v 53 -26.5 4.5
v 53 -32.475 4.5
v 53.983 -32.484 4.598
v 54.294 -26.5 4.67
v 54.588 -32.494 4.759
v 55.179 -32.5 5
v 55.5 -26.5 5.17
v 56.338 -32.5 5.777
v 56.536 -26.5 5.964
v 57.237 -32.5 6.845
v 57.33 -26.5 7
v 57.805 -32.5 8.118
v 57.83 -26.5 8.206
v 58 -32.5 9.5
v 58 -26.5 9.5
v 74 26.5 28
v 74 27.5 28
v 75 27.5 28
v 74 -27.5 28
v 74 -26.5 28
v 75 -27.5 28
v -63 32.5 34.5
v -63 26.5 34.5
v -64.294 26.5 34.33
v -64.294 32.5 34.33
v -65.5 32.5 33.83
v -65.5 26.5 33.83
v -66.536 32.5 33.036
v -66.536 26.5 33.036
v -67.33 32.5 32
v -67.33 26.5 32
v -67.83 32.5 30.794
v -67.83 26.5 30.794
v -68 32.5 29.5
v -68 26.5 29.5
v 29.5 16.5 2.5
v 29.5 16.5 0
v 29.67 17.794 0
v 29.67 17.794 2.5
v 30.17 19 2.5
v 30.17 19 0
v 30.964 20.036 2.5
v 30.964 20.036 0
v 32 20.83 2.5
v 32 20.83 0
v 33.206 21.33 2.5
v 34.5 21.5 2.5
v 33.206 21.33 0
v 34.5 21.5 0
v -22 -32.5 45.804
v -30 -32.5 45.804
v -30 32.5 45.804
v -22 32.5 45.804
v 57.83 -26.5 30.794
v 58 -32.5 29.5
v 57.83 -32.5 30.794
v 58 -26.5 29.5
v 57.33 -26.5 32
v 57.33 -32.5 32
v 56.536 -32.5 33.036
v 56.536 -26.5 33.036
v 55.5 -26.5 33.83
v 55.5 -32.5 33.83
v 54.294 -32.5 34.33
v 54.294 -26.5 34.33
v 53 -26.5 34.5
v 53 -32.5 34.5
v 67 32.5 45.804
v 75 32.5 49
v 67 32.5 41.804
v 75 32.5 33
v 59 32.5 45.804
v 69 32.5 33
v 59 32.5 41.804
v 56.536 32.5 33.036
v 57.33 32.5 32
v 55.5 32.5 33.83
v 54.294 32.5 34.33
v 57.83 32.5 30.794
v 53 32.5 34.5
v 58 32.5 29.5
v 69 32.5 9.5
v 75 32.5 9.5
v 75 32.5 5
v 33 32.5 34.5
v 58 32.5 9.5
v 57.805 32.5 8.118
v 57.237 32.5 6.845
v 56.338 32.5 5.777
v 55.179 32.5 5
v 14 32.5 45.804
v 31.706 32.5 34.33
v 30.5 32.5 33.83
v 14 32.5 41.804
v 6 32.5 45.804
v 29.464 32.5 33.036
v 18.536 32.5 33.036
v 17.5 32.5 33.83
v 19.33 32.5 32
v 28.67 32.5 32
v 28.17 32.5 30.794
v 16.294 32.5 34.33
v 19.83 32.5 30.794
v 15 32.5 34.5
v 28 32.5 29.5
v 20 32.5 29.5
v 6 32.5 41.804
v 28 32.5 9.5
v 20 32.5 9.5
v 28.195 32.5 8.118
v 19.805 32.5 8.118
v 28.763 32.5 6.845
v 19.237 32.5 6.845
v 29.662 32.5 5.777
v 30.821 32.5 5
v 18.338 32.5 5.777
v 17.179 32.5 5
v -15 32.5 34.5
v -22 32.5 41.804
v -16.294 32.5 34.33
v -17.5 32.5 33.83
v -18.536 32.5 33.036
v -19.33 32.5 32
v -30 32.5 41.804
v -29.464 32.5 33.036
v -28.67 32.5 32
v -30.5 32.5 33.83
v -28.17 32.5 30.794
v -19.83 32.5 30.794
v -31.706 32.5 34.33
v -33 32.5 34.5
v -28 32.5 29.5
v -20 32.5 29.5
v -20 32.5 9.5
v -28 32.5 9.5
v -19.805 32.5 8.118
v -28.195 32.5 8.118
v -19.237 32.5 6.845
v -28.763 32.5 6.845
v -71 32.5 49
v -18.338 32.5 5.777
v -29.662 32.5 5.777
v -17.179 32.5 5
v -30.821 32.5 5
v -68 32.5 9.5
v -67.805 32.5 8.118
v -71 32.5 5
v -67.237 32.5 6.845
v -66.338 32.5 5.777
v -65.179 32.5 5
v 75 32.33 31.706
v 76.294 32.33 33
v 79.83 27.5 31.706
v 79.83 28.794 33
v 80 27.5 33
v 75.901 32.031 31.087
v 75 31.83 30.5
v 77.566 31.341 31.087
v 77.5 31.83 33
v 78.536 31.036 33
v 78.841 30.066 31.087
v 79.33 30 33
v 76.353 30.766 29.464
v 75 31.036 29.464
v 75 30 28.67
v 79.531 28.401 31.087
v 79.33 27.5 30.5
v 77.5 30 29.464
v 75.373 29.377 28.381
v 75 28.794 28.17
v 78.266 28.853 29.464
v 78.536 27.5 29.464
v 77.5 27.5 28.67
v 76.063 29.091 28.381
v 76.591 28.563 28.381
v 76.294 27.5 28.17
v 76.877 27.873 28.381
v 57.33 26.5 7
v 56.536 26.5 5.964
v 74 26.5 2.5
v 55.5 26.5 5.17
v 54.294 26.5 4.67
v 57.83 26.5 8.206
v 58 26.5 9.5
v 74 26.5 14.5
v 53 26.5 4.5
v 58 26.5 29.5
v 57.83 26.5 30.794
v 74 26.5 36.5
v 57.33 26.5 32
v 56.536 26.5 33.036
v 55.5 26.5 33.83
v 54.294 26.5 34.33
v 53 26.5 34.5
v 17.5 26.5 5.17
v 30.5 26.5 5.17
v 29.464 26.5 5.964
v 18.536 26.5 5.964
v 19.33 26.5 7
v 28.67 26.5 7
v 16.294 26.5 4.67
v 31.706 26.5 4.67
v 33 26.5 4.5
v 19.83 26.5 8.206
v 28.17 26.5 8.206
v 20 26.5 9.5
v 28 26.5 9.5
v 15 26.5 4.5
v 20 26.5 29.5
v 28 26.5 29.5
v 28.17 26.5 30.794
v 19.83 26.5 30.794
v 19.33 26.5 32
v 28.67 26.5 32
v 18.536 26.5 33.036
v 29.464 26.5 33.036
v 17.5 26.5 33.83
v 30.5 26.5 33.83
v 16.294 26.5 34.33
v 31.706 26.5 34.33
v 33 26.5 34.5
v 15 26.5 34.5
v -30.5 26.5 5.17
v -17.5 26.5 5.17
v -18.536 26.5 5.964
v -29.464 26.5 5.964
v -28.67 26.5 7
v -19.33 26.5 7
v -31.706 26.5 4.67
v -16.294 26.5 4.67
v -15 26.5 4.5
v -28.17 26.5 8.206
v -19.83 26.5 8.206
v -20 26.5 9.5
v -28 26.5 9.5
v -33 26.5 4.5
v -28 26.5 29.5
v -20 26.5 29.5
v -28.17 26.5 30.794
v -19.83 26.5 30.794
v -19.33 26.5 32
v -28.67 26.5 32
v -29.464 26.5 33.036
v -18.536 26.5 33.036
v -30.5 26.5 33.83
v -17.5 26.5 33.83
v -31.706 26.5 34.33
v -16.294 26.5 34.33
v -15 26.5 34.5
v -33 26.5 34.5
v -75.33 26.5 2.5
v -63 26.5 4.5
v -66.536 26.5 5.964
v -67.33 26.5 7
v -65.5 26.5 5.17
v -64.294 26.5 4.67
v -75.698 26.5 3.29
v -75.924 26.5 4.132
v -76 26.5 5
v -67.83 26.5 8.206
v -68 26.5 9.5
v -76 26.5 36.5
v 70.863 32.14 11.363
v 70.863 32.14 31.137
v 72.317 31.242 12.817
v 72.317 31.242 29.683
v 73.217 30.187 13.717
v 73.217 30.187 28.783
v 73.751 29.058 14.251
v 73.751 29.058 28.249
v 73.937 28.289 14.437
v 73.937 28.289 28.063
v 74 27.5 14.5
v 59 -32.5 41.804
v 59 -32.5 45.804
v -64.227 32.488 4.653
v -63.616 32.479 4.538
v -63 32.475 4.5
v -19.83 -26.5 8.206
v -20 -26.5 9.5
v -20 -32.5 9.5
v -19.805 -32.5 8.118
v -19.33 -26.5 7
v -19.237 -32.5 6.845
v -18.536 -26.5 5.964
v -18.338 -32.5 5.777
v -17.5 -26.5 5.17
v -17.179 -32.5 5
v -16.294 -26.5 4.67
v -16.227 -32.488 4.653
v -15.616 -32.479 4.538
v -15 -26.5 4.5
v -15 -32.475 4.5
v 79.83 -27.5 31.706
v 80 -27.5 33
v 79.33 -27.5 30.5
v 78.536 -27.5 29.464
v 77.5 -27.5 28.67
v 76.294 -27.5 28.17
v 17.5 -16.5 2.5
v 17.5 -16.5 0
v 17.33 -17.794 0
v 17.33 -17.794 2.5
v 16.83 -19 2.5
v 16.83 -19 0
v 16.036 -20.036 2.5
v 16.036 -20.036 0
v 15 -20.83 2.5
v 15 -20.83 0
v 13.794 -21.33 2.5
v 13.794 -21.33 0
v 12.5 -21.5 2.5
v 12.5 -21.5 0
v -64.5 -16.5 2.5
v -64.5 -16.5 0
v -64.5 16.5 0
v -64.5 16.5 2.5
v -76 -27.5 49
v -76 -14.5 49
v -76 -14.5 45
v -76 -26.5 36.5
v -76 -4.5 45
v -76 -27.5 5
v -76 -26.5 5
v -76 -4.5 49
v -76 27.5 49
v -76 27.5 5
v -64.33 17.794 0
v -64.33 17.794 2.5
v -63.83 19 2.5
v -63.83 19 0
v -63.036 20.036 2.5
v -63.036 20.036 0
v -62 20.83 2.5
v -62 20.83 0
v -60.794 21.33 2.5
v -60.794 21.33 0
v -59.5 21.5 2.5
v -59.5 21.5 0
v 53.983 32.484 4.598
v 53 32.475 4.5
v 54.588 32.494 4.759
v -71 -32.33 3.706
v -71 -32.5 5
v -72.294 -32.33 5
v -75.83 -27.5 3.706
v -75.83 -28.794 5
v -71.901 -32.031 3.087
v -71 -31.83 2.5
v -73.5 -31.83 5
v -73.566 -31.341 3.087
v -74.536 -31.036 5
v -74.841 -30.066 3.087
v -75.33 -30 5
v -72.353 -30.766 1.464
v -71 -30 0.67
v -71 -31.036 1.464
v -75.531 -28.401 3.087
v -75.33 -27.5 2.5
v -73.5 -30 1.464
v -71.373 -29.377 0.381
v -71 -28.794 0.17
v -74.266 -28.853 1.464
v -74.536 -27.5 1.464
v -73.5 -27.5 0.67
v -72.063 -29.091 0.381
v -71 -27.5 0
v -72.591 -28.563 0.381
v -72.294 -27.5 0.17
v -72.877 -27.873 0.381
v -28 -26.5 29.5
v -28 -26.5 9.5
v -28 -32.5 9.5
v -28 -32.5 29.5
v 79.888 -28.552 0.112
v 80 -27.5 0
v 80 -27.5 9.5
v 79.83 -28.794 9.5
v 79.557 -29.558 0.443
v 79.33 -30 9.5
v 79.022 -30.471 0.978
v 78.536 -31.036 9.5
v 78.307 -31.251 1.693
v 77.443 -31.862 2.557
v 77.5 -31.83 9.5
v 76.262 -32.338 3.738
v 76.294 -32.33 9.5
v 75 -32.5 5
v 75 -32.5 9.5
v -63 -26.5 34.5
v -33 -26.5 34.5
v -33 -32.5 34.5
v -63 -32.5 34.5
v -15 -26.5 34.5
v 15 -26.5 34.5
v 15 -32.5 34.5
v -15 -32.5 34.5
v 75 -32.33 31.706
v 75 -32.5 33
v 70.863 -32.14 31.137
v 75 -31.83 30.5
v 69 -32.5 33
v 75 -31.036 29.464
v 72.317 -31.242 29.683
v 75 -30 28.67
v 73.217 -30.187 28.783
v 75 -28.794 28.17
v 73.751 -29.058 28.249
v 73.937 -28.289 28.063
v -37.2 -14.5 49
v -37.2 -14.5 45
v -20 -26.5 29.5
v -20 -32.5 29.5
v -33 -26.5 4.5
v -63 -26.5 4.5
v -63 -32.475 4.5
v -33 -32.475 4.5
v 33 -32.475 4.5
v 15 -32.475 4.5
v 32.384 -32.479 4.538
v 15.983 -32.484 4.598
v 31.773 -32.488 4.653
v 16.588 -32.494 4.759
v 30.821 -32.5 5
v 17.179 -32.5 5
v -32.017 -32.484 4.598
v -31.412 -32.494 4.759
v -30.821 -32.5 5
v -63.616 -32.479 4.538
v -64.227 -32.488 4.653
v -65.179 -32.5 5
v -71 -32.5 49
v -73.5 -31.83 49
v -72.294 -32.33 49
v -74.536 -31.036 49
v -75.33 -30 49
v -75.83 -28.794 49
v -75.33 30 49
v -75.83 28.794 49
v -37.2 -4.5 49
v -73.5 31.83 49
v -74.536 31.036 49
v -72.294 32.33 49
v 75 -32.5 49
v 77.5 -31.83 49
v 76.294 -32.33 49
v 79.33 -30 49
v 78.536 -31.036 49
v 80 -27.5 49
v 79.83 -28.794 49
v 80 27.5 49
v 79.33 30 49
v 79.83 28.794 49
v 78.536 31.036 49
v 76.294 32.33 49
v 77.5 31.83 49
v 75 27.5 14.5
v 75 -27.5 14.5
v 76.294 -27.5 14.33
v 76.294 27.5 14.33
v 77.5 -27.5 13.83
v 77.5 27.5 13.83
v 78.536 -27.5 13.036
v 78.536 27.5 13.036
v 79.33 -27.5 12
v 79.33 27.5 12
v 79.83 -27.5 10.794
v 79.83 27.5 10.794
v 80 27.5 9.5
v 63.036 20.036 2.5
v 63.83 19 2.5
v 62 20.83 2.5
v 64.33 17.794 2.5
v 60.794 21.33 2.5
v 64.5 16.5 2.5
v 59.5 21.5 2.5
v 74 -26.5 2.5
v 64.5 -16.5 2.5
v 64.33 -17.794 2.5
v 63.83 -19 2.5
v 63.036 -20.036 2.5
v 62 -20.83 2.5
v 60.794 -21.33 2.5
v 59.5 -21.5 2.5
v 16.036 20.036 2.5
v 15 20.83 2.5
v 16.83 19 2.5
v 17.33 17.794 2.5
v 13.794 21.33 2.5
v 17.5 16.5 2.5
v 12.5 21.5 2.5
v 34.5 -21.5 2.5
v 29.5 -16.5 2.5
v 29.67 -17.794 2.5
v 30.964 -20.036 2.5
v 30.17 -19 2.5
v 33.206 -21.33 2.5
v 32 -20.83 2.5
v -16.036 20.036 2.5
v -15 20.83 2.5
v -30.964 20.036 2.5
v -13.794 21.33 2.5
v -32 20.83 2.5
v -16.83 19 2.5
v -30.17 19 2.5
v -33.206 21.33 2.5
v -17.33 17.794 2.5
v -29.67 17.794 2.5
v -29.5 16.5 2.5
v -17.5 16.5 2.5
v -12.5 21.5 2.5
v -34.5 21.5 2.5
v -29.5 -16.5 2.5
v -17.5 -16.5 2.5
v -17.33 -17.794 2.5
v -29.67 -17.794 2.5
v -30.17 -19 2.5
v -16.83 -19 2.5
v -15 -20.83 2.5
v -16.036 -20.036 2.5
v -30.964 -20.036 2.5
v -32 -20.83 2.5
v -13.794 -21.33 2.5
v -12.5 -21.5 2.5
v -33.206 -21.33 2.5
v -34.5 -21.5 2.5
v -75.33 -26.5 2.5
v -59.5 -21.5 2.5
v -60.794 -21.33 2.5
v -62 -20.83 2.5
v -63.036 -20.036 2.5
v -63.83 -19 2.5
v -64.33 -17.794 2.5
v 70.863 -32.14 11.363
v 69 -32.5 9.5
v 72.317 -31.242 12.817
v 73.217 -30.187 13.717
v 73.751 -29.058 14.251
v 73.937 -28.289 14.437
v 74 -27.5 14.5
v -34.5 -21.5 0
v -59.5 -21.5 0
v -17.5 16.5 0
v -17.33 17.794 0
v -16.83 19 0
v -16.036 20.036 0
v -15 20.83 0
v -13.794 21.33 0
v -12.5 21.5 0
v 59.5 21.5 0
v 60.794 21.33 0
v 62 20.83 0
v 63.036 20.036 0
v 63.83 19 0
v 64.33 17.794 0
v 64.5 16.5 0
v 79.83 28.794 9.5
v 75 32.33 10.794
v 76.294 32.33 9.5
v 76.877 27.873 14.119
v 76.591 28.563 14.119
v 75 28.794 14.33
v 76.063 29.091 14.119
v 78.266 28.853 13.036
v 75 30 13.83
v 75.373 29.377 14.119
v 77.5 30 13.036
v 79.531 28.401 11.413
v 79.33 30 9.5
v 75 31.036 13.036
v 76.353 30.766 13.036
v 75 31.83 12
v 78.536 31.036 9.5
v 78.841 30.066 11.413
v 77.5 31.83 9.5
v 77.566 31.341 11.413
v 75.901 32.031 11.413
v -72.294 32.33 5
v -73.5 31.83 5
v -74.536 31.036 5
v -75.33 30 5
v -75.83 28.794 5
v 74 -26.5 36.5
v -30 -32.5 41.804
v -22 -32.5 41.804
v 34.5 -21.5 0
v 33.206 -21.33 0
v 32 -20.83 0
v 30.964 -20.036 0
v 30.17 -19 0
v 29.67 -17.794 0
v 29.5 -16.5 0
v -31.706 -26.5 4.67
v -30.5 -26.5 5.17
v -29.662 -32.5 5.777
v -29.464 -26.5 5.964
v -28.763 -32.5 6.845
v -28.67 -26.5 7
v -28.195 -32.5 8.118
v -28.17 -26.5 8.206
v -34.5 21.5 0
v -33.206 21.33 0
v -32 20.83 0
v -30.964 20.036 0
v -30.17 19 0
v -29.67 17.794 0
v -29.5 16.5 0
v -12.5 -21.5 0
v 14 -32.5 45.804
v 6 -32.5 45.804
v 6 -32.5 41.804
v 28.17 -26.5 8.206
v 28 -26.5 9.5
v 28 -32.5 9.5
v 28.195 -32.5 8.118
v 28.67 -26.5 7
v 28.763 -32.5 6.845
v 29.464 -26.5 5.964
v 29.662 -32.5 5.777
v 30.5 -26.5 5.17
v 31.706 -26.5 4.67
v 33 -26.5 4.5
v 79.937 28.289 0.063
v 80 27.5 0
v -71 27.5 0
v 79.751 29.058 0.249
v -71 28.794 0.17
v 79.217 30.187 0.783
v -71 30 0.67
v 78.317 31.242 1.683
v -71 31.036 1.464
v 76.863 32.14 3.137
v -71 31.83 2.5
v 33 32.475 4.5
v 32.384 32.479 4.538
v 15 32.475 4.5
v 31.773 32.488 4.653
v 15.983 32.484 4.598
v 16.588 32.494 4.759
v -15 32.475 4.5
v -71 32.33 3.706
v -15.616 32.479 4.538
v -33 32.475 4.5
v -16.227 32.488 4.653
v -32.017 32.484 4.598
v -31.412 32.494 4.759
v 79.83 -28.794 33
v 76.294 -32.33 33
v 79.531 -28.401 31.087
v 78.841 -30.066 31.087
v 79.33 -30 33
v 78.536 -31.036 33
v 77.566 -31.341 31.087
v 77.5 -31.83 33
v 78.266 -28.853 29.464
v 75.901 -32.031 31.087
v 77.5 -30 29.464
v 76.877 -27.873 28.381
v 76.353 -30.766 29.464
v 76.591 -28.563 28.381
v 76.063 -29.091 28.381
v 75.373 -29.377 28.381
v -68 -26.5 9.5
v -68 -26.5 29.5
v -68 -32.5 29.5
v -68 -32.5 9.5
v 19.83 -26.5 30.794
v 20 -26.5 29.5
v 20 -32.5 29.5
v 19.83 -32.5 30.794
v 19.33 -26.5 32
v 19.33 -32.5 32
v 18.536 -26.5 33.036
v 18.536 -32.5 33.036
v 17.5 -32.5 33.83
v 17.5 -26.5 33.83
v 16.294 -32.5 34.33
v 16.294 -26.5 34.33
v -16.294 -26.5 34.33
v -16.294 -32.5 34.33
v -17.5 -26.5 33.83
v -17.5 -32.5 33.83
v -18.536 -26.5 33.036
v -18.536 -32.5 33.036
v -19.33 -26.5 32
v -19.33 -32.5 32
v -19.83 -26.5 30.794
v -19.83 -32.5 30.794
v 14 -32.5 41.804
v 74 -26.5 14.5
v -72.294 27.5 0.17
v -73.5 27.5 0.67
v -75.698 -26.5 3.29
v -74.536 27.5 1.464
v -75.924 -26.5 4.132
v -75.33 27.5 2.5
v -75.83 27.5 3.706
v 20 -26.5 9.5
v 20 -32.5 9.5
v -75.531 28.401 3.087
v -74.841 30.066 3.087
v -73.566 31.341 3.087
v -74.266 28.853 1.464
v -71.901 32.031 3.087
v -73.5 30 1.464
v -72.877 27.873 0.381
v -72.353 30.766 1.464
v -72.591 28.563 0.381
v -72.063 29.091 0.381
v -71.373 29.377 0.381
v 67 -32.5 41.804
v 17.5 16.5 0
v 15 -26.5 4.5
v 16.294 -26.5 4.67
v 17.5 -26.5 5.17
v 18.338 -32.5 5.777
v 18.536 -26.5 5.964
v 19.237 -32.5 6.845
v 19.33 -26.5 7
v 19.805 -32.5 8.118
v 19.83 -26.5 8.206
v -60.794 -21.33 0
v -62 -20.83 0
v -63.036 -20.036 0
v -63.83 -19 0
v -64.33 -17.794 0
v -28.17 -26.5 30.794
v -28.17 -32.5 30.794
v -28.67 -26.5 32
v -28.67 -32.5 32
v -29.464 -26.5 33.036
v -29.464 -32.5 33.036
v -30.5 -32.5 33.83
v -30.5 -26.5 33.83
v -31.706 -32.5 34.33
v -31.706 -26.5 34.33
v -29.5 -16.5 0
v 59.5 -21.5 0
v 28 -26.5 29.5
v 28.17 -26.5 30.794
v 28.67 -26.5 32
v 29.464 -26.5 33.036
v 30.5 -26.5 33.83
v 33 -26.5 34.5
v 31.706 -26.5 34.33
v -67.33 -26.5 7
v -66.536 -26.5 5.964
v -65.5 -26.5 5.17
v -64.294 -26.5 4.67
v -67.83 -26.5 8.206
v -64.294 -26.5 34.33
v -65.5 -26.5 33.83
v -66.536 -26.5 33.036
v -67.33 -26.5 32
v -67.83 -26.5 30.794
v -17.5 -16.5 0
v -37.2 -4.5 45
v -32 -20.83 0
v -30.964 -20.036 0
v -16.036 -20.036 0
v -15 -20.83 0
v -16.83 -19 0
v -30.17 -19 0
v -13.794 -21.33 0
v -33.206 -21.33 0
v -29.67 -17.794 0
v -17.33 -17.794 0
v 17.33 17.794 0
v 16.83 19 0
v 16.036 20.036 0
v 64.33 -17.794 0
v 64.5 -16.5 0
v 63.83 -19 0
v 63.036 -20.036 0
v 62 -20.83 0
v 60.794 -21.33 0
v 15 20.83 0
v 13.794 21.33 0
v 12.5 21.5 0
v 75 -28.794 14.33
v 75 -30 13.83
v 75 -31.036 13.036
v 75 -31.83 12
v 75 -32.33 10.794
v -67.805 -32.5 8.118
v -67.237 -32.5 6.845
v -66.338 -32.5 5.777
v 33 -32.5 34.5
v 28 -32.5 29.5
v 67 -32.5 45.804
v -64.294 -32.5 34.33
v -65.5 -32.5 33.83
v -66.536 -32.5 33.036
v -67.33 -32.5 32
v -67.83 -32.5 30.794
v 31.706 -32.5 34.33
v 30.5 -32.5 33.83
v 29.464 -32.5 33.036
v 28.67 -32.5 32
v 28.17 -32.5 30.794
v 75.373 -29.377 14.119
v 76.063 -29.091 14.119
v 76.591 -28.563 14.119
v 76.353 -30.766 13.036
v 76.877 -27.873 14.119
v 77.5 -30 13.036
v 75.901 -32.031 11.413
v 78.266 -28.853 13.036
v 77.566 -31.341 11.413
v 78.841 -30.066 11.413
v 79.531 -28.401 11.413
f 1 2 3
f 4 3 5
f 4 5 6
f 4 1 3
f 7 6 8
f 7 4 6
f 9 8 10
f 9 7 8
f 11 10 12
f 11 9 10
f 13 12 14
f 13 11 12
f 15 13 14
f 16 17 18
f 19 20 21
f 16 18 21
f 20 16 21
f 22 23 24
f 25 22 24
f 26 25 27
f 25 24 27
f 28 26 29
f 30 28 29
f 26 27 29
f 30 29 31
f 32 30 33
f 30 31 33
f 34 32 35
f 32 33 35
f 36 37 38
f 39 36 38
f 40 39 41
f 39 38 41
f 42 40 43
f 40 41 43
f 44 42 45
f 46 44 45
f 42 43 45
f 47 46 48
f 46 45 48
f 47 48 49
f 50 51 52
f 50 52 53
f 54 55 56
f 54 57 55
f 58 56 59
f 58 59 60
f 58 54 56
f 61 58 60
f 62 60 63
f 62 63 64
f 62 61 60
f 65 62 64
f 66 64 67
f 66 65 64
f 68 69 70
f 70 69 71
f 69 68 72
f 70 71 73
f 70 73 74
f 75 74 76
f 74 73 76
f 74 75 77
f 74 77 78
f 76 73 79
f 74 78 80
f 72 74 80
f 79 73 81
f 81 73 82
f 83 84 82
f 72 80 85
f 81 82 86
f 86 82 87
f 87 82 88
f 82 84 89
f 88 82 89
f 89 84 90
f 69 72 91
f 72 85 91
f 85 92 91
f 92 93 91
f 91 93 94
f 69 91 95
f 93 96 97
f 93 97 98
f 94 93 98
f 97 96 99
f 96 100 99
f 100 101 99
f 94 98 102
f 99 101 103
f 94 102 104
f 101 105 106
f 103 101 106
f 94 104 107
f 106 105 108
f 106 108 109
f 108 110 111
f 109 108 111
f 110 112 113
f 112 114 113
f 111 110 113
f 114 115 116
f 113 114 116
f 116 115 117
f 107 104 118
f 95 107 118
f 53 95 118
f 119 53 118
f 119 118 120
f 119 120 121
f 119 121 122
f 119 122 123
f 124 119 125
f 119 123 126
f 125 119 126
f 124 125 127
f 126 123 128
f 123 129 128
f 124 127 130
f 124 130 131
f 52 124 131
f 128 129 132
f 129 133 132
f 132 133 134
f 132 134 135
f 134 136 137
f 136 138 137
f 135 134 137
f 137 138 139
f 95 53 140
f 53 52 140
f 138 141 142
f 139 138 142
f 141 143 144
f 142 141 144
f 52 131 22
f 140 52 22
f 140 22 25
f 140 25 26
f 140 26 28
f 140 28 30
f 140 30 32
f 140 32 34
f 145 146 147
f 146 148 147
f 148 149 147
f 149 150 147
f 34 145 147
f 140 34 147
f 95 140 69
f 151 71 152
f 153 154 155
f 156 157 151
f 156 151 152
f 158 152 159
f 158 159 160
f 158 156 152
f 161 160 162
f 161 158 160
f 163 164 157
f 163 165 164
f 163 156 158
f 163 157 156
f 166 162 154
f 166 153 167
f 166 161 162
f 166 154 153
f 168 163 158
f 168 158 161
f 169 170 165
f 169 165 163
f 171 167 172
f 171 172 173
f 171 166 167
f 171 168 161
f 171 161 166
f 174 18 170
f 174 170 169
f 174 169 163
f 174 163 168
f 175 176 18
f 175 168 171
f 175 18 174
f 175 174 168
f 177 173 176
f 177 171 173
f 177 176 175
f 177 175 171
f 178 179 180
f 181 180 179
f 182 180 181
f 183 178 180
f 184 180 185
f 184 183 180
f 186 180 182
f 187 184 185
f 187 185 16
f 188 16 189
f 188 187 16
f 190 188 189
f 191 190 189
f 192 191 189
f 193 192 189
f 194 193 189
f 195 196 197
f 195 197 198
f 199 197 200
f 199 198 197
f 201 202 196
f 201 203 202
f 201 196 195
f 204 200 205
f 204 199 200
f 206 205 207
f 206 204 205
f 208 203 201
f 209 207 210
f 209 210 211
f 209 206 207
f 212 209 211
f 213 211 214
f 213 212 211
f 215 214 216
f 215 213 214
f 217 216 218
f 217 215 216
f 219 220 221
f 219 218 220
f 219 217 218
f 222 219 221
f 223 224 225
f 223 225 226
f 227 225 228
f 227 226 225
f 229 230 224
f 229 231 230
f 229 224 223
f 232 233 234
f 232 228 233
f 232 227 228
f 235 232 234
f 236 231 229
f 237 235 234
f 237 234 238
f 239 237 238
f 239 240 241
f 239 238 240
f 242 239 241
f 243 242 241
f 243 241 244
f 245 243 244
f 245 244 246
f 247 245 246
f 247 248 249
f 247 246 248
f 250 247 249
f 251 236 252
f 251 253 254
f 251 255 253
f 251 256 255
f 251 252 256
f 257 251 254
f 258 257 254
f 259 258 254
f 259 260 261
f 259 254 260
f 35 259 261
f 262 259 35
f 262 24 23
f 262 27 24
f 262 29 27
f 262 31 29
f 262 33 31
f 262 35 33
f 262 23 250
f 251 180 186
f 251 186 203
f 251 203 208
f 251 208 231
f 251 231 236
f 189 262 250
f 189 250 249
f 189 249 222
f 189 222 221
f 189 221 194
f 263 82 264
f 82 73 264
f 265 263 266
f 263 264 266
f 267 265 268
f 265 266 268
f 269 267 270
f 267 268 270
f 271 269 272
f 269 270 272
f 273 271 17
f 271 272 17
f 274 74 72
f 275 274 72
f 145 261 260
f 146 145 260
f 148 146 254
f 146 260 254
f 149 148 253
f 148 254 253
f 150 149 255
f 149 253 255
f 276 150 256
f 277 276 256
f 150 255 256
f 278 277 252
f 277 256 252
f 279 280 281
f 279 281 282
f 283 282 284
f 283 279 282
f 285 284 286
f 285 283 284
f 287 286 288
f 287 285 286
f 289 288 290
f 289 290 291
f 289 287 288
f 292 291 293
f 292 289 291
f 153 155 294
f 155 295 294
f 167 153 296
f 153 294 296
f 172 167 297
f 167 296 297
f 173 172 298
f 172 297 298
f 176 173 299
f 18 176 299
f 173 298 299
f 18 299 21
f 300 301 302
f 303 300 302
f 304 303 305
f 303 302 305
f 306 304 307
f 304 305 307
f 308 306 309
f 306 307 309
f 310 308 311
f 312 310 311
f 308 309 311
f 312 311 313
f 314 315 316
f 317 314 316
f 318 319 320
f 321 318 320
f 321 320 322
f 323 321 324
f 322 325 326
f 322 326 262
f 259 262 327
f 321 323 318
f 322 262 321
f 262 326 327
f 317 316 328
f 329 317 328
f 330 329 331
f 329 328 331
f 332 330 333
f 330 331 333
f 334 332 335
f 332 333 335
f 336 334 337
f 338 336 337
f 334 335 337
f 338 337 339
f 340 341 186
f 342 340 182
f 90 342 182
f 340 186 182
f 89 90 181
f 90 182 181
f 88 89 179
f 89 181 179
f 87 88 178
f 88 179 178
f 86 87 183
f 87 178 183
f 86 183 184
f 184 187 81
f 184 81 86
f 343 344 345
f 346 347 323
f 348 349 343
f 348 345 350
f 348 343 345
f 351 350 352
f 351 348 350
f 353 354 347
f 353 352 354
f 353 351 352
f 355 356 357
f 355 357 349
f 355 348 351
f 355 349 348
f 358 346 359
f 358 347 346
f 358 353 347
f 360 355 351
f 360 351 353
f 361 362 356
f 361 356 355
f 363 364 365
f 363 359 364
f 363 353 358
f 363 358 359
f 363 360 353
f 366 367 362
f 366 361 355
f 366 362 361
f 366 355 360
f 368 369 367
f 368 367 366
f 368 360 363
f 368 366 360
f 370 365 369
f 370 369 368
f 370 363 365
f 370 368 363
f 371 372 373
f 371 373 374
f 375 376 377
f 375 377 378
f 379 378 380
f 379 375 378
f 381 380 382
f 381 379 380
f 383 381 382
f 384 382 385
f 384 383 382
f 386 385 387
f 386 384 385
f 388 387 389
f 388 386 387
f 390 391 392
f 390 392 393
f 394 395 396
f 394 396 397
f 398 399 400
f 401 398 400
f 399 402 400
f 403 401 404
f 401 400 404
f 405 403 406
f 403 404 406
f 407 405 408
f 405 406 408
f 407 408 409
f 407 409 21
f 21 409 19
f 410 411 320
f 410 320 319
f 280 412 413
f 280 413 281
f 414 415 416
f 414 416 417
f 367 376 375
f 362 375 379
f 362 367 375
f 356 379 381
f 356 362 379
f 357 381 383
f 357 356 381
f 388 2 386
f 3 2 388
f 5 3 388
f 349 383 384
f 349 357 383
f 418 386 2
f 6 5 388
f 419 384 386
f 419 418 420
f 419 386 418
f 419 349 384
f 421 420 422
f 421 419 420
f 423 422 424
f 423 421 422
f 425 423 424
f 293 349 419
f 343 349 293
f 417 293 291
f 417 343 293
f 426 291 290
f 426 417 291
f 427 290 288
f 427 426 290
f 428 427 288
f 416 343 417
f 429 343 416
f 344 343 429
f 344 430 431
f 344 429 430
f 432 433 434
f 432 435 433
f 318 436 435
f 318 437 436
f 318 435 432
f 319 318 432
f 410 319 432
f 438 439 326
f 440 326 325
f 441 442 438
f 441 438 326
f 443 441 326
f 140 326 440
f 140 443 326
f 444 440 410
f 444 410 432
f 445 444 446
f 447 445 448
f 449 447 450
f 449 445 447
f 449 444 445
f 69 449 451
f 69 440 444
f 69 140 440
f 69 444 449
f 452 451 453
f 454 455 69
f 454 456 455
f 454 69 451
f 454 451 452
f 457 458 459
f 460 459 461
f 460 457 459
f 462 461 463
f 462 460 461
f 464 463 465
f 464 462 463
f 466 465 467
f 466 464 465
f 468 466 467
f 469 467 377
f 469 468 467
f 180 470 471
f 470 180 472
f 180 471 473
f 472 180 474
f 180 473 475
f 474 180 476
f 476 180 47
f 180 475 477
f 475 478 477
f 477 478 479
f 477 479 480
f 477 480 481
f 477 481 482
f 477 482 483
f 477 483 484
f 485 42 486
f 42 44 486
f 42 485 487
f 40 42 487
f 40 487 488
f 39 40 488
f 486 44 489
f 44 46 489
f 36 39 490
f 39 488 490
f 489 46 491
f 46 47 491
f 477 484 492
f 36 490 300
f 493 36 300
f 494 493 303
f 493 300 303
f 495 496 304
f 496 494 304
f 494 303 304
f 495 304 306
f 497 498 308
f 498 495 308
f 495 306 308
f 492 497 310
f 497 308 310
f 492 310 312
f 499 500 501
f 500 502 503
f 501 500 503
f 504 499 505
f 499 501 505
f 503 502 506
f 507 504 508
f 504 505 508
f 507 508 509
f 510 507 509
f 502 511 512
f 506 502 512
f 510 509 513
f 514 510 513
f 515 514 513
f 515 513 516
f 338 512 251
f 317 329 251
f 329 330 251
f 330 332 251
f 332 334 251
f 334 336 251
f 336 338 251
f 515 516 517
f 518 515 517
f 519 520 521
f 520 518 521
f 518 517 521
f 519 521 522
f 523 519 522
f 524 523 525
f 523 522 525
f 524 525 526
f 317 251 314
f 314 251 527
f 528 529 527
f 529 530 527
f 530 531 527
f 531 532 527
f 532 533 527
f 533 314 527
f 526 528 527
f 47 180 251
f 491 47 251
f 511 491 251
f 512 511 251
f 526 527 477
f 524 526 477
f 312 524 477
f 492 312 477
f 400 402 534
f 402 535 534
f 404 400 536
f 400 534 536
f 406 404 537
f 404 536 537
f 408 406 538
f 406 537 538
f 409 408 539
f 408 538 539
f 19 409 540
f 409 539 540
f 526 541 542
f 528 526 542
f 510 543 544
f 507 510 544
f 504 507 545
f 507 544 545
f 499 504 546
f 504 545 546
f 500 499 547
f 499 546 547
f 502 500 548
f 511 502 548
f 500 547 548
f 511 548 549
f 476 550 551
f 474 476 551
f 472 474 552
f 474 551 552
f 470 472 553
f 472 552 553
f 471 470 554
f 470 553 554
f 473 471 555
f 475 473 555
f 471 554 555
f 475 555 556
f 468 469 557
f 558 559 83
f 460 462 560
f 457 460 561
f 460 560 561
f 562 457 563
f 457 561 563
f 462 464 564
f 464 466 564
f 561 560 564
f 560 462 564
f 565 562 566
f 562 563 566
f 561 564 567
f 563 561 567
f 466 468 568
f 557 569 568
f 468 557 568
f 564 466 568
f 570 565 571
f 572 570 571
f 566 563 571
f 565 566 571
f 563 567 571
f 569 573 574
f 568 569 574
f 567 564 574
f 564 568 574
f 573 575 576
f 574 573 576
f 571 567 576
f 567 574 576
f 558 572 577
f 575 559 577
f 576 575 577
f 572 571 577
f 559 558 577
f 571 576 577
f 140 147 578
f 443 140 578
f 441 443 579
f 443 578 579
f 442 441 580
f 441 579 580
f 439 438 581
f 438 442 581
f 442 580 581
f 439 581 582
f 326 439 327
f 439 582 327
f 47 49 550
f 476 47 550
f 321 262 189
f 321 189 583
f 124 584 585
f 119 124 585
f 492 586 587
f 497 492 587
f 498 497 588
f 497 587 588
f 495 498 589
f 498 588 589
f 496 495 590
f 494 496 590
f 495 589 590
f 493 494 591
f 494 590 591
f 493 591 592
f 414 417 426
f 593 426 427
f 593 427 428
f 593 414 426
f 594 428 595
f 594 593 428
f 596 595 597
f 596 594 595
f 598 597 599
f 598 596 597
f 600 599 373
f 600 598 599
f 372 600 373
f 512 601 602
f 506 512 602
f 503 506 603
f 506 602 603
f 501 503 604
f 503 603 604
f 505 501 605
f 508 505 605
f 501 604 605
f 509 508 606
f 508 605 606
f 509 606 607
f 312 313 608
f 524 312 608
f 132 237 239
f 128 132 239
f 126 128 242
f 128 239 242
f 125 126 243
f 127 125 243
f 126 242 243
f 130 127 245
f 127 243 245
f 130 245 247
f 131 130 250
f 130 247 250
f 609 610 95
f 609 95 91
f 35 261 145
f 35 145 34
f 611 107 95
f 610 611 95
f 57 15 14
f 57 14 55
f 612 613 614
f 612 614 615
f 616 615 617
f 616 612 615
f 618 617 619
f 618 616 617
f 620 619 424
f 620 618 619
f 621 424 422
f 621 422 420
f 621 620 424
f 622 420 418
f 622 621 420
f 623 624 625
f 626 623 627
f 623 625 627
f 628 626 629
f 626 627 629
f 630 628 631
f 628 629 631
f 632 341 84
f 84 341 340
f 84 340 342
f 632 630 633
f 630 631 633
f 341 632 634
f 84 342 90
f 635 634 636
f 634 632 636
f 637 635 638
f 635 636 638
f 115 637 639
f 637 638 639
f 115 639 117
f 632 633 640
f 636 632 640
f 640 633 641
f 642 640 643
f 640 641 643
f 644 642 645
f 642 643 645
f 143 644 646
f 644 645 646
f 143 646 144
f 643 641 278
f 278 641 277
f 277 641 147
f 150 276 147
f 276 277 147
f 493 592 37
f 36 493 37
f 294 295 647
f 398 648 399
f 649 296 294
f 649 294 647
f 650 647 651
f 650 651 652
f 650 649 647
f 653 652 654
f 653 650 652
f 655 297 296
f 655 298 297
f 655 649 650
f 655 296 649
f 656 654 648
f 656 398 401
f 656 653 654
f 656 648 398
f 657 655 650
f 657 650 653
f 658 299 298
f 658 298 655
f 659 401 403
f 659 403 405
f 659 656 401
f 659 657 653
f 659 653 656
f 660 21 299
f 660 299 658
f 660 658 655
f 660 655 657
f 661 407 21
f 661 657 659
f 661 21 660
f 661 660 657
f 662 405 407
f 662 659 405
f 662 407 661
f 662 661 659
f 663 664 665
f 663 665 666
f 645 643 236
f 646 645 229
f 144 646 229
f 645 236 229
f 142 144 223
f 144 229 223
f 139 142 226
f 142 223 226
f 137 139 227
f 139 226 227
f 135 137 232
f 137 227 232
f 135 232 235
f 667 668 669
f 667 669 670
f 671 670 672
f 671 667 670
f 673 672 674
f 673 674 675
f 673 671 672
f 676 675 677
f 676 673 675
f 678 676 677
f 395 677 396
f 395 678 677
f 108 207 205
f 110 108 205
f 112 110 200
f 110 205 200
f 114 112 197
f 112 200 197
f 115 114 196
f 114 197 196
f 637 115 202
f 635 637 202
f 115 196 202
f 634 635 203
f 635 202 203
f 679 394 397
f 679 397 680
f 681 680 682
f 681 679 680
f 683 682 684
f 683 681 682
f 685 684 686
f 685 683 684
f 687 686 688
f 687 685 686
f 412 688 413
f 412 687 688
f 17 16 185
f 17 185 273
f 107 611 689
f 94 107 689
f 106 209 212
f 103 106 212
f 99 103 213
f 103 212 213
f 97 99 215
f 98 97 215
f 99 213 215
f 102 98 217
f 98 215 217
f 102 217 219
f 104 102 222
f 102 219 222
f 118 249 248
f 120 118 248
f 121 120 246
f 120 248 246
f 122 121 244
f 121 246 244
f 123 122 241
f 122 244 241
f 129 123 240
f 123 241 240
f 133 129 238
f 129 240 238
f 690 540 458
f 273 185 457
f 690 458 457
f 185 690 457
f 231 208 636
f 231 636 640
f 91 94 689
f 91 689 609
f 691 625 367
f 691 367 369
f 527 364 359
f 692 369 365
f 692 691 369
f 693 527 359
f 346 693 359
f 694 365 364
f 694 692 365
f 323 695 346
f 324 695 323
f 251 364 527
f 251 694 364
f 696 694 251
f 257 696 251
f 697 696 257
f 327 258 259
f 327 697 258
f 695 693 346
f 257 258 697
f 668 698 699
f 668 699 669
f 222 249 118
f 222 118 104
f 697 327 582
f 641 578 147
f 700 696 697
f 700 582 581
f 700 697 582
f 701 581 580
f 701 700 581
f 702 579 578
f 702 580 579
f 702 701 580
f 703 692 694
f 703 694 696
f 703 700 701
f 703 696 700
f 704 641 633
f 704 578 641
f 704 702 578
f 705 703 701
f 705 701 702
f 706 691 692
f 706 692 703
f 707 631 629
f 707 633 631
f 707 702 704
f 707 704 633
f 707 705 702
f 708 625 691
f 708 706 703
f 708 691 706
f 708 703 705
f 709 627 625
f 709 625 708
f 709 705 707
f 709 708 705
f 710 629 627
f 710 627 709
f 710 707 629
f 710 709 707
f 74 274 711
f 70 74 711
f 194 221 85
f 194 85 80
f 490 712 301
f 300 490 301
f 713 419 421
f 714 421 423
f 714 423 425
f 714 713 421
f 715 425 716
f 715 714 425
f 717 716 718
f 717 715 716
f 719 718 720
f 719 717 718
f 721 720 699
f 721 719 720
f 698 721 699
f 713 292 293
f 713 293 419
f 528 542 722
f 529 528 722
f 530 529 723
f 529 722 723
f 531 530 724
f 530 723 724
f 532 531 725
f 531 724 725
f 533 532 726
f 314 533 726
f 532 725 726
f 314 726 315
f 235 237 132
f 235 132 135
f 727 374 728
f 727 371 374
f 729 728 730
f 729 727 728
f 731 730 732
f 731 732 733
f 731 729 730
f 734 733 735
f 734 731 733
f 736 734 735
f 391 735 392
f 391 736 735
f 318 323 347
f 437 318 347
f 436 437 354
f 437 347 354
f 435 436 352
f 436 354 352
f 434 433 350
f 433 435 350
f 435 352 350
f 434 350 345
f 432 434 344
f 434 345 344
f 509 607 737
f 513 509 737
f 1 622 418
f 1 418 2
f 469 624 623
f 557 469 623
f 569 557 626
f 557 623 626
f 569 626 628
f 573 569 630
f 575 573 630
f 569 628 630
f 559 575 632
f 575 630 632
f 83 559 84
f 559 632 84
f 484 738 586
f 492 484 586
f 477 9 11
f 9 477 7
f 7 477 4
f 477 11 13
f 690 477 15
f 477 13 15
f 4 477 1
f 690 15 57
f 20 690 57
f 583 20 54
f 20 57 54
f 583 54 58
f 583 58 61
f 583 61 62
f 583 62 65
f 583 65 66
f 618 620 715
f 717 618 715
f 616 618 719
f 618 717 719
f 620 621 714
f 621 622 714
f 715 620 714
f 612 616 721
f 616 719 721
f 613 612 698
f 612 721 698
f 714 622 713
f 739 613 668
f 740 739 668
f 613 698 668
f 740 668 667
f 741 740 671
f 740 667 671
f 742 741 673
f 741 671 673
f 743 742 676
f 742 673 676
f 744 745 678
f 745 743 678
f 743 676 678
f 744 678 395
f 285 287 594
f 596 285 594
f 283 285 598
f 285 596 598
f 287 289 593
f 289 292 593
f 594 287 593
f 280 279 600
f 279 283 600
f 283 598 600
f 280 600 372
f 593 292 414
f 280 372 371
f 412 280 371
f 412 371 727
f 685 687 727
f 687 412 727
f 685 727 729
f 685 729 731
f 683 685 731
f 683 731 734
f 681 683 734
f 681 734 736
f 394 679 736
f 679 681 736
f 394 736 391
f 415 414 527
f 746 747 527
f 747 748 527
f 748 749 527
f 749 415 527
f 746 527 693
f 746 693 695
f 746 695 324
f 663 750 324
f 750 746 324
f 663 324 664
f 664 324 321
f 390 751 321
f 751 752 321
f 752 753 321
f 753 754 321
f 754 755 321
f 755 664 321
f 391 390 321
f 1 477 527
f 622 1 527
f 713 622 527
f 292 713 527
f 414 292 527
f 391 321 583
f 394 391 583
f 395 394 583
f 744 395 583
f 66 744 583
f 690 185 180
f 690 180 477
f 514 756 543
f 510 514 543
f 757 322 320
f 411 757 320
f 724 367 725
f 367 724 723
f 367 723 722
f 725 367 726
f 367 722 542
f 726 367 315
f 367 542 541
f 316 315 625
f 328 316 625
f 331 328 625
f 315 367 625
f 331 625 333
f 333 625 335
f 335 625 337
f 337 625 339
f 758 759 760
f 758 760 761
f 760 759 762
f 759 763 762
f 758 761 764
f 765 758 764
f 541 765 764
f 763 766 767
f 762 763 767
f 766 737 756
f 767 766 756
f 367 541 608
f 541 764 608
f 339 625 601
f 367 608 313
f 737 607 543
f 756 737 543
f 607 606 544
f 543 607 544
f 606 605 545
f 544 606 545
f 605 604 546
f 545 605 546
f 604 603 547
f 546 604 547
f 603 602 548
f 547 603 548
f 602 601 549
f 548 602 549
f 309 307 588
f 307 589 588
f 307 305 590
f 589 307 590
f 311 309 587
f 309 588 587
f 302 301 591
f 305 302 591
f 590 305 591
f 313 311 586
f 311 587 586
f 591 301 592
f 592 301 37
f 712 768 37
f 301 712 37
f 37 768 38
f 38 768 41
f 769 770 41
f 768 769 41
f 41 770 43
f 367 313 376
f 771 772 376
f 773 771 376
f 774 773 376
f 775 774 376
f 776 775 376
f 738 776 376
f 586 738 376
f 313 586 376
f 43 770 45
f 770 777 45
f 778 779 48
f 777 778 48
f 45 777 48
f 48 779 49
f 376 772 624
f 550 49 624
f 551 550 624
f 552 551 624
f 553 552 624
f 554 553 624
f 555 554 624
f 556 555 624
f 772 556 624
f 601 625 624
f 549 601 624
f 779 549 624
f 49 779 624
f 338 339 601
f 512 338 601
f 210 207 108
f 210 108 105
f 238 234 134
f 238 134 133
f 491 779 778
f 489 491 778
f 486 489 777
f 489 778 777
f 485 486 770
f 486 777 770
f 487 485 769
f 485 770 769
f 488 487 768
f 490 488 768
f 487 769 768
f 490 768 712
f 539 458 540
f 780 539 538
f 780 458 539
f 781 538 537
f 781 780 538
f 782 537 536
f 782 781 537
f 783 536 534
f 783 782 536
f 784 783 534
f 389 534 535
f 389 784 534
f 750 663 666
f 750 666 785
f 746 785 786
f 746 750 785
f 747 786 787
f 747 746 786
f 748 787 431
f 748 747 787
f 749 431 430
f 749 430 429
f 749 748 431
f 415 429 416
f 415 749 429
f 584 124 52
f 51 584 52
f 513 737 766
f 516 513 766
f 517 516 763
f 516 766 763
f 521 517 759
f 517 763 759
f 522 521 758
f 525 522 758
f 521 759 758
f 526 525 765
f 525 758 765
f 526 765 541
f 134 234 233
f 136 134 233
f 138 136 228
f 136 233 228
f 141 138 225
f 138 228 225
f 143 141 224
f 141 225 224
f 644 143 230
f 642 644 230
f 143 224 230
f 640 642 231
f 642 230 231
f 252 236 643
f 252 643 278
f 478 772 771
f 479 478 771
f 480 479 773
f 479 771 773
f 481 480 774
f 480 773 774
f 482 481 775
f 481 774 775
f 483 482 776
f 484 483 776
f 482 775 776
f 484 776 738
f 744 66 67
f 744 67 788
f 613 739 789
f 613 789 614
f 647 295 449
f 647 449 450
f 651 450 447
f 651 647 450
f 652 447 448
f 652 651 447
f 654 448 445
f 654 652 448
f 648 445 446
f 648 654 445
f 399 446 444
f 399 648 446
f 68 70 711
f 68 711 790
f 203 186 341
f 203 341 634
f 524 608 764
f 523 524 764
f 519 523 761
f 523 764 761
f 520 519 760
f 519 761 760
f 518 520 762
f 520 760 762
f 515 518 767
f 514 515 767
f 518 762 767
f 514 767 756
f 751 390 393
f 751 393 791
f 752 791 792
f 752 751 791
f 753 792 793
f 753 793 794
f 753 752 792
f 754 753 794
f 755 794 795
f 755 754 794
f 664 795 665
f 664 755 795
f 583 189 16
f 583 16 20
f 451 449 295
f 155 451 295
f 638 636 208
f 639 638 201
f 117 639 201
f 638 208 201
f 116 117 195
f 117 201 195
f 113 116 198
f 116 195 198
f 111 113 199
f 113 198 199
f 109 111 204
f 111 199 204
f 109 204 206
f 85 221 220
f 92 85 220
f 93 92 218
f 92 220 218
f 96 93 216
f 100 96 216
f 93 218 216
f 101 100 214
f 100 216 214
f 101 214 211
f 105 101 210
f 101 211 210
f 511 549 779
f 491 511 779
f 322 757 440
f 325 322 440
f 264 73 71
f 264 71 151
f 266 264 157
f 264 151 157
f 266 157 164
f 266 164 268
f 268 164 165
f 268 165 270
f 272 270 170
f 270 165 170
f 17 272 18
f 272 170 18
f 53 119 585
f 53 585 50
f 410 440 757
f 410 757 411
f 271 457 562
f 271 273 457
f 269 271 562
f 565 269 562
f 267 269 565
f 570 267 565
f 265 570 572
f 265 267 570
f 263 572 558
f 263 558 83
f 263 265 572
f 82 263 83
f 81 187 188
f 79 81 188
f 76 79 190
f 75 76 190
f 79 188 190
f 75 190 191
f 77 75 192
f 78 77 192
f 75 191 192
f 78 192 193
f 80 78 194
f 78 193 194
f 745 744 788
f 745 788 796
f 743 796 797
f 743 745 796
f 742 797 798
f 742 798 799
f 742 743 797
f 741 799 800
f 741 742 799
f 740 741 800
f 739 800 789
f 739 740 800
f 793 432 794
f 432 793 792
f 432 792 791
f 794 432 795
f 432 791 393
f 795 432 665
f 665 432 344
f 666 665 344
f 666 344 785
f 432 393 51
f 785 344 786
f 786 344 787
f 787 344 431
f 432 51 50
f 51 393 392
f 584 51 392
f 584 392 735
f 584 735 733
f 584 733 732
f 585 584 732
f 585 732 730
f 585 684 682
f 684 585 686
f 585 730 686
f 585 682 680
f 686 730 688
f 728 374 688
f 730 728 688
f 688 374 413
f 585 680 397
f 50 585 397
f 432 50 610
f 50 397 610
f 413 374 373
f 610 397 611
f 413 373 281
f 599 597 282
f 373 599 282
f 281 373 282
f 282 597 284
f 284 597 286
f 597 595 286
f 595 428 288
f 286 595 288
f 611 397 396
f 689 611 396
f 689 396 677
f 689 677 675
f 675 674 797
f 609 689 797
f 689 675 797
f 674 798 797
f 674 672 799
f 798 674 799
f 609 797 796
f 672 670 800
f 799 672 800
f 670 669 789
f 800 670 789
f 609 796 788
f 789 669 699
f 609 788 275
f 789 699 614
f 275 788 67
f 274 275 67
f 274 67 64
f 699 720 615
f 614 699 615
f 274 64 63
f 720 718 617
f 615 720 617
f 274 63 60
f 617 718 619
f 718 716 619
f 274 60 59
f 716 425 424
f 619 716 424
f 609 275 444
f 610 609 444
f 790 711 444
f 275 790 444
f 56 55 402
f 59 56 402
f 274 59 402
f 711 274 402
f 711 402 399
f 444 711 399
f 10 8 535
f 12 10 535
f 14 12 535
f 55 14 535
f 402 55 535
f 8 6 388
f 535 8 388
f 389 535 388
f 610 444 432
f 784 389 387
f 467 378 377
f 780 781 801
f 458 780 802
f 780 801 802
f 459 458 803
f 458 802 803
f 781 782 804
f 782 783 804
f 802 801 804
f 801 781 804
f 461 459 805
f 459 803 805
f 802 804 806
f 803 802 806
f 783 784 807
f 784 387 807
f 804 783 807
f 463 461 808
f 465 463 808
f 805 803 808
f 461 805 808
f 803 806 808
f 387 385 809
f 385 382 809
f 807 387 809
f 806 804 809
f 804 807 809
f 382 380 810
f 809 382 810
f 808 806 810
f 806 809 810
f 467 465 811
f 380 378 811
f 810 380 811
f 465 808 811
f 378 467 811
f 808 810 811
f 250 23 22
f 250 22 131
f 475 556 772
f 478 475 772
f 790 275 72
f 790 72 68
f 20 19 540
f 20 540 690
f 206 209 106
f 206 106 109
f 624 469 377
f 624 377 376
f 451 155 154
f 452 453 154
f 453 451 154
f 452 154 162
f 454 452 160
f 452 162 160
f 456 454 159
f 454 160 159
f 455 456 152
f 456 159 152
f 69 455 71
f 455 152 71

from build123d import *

# Parameters (mm, degrees)
F0_W          = 152
F0_H          = 55
F1_DEPTH      = 39
F2_W          = 53
F2_H          = 34
F3_DEPTH      = 150
F5_DEPTH      = 10.9
F7_DEPTH      = 100
F8_DEPTH      = 5
F9_DEPTH      = 4
F10_DEPTH     = 5
F11_DEPTH     = 5
F12_DEPTH     = 5
F13_W         = 8
F13_H         = 4
F14_DEPTH     = 100
F15_T1_DEPTH  = 163.5
F15_T3_DEPTH  = 74
F15_T5_DEPTH  = 56.5
F15_T7_DEPTH  = 55
F15_S11_W     = 5
F15_S11_H     = 5
F15_T12_DEPTH = 5
F15_S17_W     = 5
F15_S17_H     = 5
F15_T18_DEPTH = 5
F16_W         = 7.2434431314
F16_H         = 13.5
F16_W_2       = 55
F16_W_3       = 10.0454574823
F17_DEPTH     = 6
F18_R         = 5
F19_W         = 10
F19_H         = 4
F20_DEPTH     = 38.8


# Not quite as in the source:
# - a fillet or chamfer that OpenCascade refuses, or shapes differently, is made with other operations: its cross-section is extruded or revolved along the edge and cut away or added


with BuildPart() as f1:
    # F0 (on Top) → F1 (new body)
    with BuildSketch(Plane.XY):
        Rectangle(F0_W, F0_H)
    extrude(amount=F1_DEPTH)

    # F2 (on face) → F3 (cut)
    with BuildSketch(Plane(origin=(-76, 0, 0), x_dir=(0, -1, 0), z_dir=(-1, 0, 0))):
        with Locations((0, 19.5)):
            Rectangle(F2_W, F2_H)
    extrude(amount=-F3_DEPTH, mode=Mode.SUBTRACT)

    # F4 (on face) → F5 (cut)
    with BuildSketch(Plane(origin=(0, 0, 0), x_dir=(1, 0, 0), z_dir=(0, 0, -1))):
        with BuildLine():
            ThreePointArc((-29.5, 16.5), (-30.9644660941, 20.0355339059), (-34.5, 21.5))
            Line((-34.5, 21.5), (-59.5, 21.5))
            ThreePointArc((-59.5, 21.5), (-63.0355339059, 20.0355339059), (-64.5, 16.5))
            Line((-64.5, 16.5), (-64.5, -16.5))
            ThreePointArc((-64.5, -16.5), (-63.0355339059, -20.0355339059), (-59.5, -21.5))
            Line((-59.5, -21.5), (-34.5, -21.5))
            ThreePointArc((-34.5, -21.5), (-30.9644660941, -20.0355339059), (-29.5, -16.5))
            Line((-29.5, -16.5), (-29.5, 16.5))
        make_face()
        with BuildLine():
            Line((-12.5, -21.5), (12.5, -21.5))
            ThreePointArc((12.5, -21.5), (16.0355339059, -20.0355339059), (17.5, -16.5))
            Line((17.5, -16.5), (17.5, 16.5))
            ThreePointArc((17.5, 16.5), (16.0355339059, 20.0355339059), (12.5, 21.5))
            Line((12.5, 21.5), (-12.5, 21.5))
            ThreePointArc((-12.5, 21.5), (-16.0355339059, 20.0355339059), (-17.5, 16.5))
            Line((-17.5, 16.5), (-17.5, -16.5))
            ThreePointArc((-17.5, -16.5), (-16.0355339059, -20.0355339059), (-12.5, -21.5))
        make_face()
        with BuildLine():
            ThreePointArc((64.5, 16.5), (63.0355339059, 20.0355339059), (59.5, 21.5))
            Line((59.5, 21.5), (34.5, 21.5))
            ThreePointArc((34.5, 21.5), (30.9644660941, 20.0355339059), (29.5, 16.5))
            Line((29.5, 16.5), (29.5, -16.5))
            ThreePointArc((29.5, -16.5), (30.9644660941, -20.0355339059), (34.5, -21.5))
            Line((34.5, -21.5), (59.5, -21.5))
            ThreePointArc((59.5, -21.5), (63.0355339059, -20.0355339059), (64.5, -16.5))
            Line((64.5, -16.5), (64.5, 16.5))
        make_face()
    extrude(amount=-F5_DEPTH, mode=Mode.SUBTRACT)

    # F6 (on face) → F7 (cut)
    with BuildSketch(Plane.XZ.offset(27.5)):
        with BuildLine():
            ThreePointArc((-28, 29.5), (-29.4644660941, 33.0355339059), (-33, 34.5))
            Line((-33, 34.5), (-63, 34.5))
            ThreePointArc((-63, 34.5), (-66.5355339059, 33.0355339059), (-68, 29.5))
            Line((-68, 29.5), (-68, 9.5))
            ThreePointArc((-68, 9.5), (-66.5355339059, 5.9644660941), (-63, 4.5))
            Line((-63, 4.5), (-33, 4.5))
            ThreePointArc((-33, 4.5), (-29.4644660941, 5.9644660941), (-28, 9.5))
            Line((-28, 9.5), (-28, 29.5))
        make_face()
        with BuildLine():
            ThreePointArc((20, 29.5), (18.5355339059, 33.0355339059), (15, 34.5))
            Line((15, 34.5), (-15, 34.5))
            ThreePointArc((-15, 34.5), (-18.5355339059, 33.0355339059), (-20, 29.5))
            Line((-20, 29.5), (-20, 9.5))
            ThreePointArc((-20, 9.5), (-18.5355339059, 5.9644660941), (-15, 4.5))
            Line((-15, 4.5), (15, 4.5))
            ThreePointArc((15, 4.5), (18.5355339059, 5.9644660941), (20, 9.5))
            Line((20, 9.5), (20, 29.5))
        make_face()
        with BuildLine():
            ThreePointArc((58, 29.5), (56.5355339059, 33.0355339059), (53, 34.5))
            Line((53, 34.5), (33, 34.5))
            ThreePointArc((33, 34.5), (29.4644660941, 33.0355339059), (28, 29.5))
            Line((28, 29.5), (28, 9.5))
            ThreePointArc((28, 9.5), (29.4644660941, 5.9644660941), (33, 4.5))
            Line((33, 4.5), (53, 4.5))
            ThreePointArc((53, 4.5), (56.5355339059, 5.9644660941), (58, 9.5))
            Line((58, 9.5), (58, 29.5))
        make_face()
    extrude(amount=-F7_DEPTH, mode=Mode.SUBTRACT)

    # F8 (add): a face of the model
    f8_faces = [f1.faces().sort_by_distance(p)[0] for p in [
        (0, 0, 39),
    ]]
    extrude(f8_faces, amount=F8_DEPTH)

    # F9 (add): a face of the model
    f9_faces = [f1.faces().sort_by_distance(p)[0] for p in [
        (76, 0, 22),
    ]]
    extrude(f9_faces, amount=F9_DEPTH)

    # F10 (add): a face of the model
    f10_faces = [f1.faces().sort_by_distance(p)[0] for p in [
        (2, 0, 44),
    ]]
    extrude(f10_faces, amount=F10_DEPTH)

    # F11 (add): a face of the model
    f11_faces = [f1.faces().sort_by_distance(p)[0] for p in [
        (-74.3648547465, 27.5, 24.5),
    ]]
    extrude(f11_faces, amount=F11_DEPTH)

    # F12 (add): a face of the model
    f12_faces = [f1.faces().sort_by_distance(p)[0] for p in [
        (-74.3648547465, -27.5, 24.5),
    ]]
    extrude(f12_faces, amount=F12_DEPTH)

    # F13 (on face) → F14 (cut)
    with BuildSketch(Plane.XZ.offset(32.5)):
        with Locations((-26, 43.8039299548)):
            Rectangle(F13_W, F13_H)
        with Locations((10, 43.8039299548)):
            Rectangle(F13_W, F13_H)
        with Locations((63, 43.8039299548)):
            Rectangle(F13_W, F13_H)
    extrude(amount=-F14_DEPTH, mode=Mode.SUBTRACT)

    # F15: fillet of radius 5 on 7 edges, made by hand

    # F15_s2 → F15_t1 (cut)
    with BuildSketch(Plane.YZ.offset(-71)):
        with BuildLine():
            ThreePointArc((-27.5, 0), (-31.0355339059, 1.4644660941), (-32.5, 5))
            Line((-32.5, 5), (-32.5, 0))
            Line((-32.5, 0), (-27.5, 0))
        make_face()
        with BuildLine():
            ThreePointArc((27.5, 0), (31.0355339059, 1.4644660941), (32.5, 5))
            Line((32.5, 5), (32.5, 0))
            Line((32.5, 0), (27.5, 0))
        make_face()
    extrude(amount=F15_T1_DEPTH, mode=Mode.SUBTRACT)

    # F15_s4 → F15_t3 (cut)
    with BuildSketch(Plane.XY.offset(-12.5)):
        with BuildLine():
            ThreePointArc((80, 27.5), (78.5355339059, 31.0355339059), (75, 32.5))
            Line((75, 32.5), (80, 32.5))
            Line((80, 32.5), (80, 27.5))
        make_face()
        with BuildLine():
            ThreePointArc((80, -27.5), (78.5355339059, -31.0355339059), (75, -32.5))
            Line((75, -32.5), (80, -32.5))
            Line((80, -32.5), (80, -27.5))
        make_face()
    extrude(amount=F15_T3_DEPTH, mode=Mode.SUBTRACT)

    # F15_s6 → F15_t5 (cut)
    with BuildSketch(Plane.XY.offset(5)):
        with BuildLine():
            ThreePointArc((-76, -27.5), (-74.5355339059, -31.0355339059), (-71, -32.5))
            Line((-71, -32.5), (-76, -32.5))
            Line((-76, -32.5), (-76, -27.5))
        make_face()
        with BuildLine():
            ThreePointArc((-71, 32.5), (-74.5355339059, 31.0355339059), (-76, 27.5))
            Line((-76, 27.5), (-76, 32.5))
            Line((-76, 32.5), (-71, 32.5))
        make_face()
    extrude(amount=F15_T5_DEPTH, mode=Mode.SUBTRACT)

    # F15_s8 → F15_t7 (cut)
    with BuildSketch(Plane.XZ.offset(-27.5)):
        with BuildLine():
            ThreePointArc((-71, 0), (-74.5355339059, 1.4644660941), (-76, 5))
            Line((-76, 5), (-76, 0))
            Line((-76, 0), (-71, 0))
        make_face()
    extrude(amount=F15_T7_DEPTH, mode=Mode.SUBTRACT)


with BuildPart() as f15_tool10:
    # F15_s11 → F15_t12 (new body)
    with BuildSketch(Plane.XY.offset(5)):
        with Locations((-73.5, -30)):
            Rectangle(F15_S11_W, F15_S11_H)
    extrude(amount=-F15_T12_DEPTH)

    # F15_s13 → F15_t14 (revolve, cut)
    with BuildSketch(Plane(origin=(-71, -27.5, 5), x_dir=(0.7071067812, 0.7071067812, 0), z_dir=(-0.7071067812, 0.7071067812, 0))):
        with BuildLine():
            ThreePointArc((0, -5), (5, 0), (0, 5))
            Line((0, 5), (0, -5))
        make_face()
    revolve(axis=Axis((-71, -27.5, 5), (0, 0, -1)), mode=Mode.SUBTRACT)


with BuildPart() as f1_1:
    add(f1.part)

    # F15_t9: cut F15_tool10
    add(f15_tool10.part, mode=Mode.SUBTRACT)


with BuildPart() as f15_tool16:
    # F15_s17 → F15_t18 (new body)
    with BuildSketch(Plane.XY.offset(5)):
        with Locations((-73.5, 30)):
            Rectangle(F15_S17_W, F15_S17_H)
    extrude(amount=-F15_T18_DEPTH)

    # F15_s19 → F15_t20 (revolve, cut)
    with BuildSketch(Plane(origin=(-71, 27.5, 5), x_dir=(0.7071067812, -0.7071067812, 0), z_dir=(0.7071067812, 0.7071067812, 0))):
        with BuildLine():
            ThreePointArc((0, -5), (5, 0), (0, 5))
            Line((0, 5), (0, -5))
        make_face()
    revolve(axis=Axis((-71, 27.5, 5), (0, 0, -1)), mode=Mode.SUBTRACT)


with BuildPart() as f1_2:
    add(f1_1.part)

    # F15_t15: cut F15_tool16
    add(f15_tool16.part, mode=Mode.SUBTRACT)

    # F16 (on face) → F17 (cut)
    with BuildSketch(Plane.YZ.offset(80)):
        with Locations((-31.1217215657, 21.25)):
            Rectangle(F16_W, F16_H)
        with Locations((0, 21.25)):
            Rectangle(F16_W_2, F16_H)
        with Locations((32.5227287412, 21.25)):
            Rectangle(F16_W_3, F16_H)
    extrude(amount=-F17_DEPTH, mode=Mode.SUBTRACT)

    # F18
    f18_edges = [f1_2.edges().sort_by_distance(p)[0] for p in [
        (74, -32.5, 21.25),
        (74, 32.5, 21.25),
        (80, 0, 28),
        (80, 0, 14.5),
    ]]
    fillet(f18_edges, radius=F18_R)

    # F19 (on face) → F20 (cut)
    with BuildSketch(Plane(origin=(-76, 0, 0), x_dir=(0, -1, 0), z_dir=(-1, 0, 0))):
        with Locations((9.5, 47)):
            Rectangle(F19_W, F19_H)
    extrude(amount=-F20_DEPTH, mode=Mode.SUBTRACT)


solid = f1_2.part
